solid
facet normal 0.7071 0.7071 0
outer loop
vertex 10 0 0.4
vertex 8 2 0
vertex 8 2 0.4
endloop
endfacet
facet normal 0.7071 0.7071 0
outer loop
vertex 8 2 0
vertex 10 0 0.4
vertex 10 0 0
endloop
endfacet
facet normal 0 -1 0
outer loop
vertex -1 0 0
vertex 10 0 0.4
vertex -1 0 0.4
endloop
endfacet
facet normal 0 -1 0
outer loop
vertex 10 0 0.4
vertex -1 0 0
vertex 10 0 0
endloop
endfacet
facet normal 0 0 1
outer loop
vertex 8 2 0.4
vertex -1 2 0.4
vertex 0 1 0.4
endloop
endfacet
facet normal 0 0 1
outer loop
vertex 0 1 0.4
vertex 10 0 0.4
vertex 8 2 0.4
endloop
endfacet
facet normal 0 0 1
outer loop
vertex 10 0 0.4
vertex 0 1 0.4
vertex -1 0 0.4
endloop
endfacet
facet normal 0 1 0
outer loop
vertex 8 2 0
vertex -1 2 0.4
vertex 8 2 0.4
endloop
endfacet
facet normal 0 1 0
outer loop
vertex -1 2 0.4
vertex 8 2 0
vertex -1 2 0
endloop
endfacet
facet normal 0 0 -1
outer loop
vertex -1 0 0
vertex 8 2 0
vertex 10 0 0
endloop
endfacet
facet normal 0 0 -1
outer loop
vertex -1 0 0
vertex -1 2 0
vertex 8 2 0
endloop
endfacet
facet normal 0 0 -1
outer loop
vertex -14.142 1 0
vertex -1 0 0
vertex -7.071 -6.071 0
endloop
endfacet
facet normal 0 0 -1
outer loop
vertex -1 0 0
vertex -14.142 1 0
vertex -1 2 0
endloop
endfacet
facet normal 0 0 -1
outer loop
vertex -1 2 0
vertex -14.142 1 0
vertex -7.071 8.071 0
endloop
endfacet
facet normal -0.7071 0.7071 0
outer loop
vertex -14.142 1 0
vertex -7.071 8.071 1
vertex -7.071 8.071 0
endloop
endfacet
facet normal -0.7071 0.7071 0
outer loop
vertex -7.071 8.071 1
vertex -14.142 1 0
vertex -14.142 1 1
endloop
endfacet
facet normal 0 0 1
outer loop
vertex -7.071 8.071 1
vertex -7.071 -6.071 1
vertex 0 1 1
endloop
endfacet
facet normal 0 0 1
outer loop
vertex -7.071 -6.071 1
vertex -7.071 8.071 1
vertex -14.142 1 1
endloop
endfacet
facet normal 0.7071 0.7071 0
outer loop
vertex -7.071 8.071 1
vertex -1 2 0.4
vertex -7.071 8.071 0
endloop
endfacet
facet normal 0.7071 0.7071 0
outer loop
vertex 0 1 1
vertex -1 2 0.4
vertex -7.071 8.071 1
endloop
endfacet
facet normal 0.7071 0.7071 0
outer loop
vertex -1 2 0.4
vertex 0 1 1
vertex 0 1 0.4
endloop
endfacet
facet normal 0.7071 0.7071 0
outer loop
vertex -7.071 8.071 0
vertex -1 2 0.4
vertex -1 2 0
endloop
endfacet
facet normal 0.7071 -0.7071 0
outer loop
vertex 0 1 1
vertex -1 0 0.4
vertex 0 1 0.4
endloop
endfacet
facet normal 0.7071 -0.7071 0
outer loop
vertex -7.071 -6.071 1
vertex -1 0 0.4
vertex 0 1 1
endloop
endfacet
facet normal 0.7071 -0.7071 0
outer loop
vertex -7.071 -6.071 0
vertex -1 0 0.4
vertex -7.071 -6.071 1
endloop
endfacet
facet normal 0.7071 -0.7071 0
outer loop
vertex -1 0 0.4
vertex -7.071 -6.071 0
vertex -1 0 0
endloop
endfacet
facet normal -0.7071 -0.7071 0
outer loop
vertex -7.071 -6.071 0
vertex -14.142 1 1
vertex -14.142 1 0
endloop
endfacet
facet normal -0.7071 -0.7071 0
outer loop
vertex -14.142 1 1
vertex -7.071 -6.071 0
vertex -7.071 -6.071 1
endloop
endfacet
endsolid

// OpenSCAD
// height (thickness)
h=0.4;

// depth (length)
d=10.0;

// width of needle
w=2.0;

// handle width
hw=10.0;

// handle depth
hd=10.0;

// handle height
hh=1.0;

linear_extrude(height=h)
polygon([[-hd/2,0],
         [d,0],
         [d-w,w],
         [-hd/2,w]]);

translate([0,w/2,0])
rotate([0,0,135])
linear_extrude(height=hh)
polygon([[0,0],
         [hd,0],
         [hd,hw],
         [0,hw]]);
